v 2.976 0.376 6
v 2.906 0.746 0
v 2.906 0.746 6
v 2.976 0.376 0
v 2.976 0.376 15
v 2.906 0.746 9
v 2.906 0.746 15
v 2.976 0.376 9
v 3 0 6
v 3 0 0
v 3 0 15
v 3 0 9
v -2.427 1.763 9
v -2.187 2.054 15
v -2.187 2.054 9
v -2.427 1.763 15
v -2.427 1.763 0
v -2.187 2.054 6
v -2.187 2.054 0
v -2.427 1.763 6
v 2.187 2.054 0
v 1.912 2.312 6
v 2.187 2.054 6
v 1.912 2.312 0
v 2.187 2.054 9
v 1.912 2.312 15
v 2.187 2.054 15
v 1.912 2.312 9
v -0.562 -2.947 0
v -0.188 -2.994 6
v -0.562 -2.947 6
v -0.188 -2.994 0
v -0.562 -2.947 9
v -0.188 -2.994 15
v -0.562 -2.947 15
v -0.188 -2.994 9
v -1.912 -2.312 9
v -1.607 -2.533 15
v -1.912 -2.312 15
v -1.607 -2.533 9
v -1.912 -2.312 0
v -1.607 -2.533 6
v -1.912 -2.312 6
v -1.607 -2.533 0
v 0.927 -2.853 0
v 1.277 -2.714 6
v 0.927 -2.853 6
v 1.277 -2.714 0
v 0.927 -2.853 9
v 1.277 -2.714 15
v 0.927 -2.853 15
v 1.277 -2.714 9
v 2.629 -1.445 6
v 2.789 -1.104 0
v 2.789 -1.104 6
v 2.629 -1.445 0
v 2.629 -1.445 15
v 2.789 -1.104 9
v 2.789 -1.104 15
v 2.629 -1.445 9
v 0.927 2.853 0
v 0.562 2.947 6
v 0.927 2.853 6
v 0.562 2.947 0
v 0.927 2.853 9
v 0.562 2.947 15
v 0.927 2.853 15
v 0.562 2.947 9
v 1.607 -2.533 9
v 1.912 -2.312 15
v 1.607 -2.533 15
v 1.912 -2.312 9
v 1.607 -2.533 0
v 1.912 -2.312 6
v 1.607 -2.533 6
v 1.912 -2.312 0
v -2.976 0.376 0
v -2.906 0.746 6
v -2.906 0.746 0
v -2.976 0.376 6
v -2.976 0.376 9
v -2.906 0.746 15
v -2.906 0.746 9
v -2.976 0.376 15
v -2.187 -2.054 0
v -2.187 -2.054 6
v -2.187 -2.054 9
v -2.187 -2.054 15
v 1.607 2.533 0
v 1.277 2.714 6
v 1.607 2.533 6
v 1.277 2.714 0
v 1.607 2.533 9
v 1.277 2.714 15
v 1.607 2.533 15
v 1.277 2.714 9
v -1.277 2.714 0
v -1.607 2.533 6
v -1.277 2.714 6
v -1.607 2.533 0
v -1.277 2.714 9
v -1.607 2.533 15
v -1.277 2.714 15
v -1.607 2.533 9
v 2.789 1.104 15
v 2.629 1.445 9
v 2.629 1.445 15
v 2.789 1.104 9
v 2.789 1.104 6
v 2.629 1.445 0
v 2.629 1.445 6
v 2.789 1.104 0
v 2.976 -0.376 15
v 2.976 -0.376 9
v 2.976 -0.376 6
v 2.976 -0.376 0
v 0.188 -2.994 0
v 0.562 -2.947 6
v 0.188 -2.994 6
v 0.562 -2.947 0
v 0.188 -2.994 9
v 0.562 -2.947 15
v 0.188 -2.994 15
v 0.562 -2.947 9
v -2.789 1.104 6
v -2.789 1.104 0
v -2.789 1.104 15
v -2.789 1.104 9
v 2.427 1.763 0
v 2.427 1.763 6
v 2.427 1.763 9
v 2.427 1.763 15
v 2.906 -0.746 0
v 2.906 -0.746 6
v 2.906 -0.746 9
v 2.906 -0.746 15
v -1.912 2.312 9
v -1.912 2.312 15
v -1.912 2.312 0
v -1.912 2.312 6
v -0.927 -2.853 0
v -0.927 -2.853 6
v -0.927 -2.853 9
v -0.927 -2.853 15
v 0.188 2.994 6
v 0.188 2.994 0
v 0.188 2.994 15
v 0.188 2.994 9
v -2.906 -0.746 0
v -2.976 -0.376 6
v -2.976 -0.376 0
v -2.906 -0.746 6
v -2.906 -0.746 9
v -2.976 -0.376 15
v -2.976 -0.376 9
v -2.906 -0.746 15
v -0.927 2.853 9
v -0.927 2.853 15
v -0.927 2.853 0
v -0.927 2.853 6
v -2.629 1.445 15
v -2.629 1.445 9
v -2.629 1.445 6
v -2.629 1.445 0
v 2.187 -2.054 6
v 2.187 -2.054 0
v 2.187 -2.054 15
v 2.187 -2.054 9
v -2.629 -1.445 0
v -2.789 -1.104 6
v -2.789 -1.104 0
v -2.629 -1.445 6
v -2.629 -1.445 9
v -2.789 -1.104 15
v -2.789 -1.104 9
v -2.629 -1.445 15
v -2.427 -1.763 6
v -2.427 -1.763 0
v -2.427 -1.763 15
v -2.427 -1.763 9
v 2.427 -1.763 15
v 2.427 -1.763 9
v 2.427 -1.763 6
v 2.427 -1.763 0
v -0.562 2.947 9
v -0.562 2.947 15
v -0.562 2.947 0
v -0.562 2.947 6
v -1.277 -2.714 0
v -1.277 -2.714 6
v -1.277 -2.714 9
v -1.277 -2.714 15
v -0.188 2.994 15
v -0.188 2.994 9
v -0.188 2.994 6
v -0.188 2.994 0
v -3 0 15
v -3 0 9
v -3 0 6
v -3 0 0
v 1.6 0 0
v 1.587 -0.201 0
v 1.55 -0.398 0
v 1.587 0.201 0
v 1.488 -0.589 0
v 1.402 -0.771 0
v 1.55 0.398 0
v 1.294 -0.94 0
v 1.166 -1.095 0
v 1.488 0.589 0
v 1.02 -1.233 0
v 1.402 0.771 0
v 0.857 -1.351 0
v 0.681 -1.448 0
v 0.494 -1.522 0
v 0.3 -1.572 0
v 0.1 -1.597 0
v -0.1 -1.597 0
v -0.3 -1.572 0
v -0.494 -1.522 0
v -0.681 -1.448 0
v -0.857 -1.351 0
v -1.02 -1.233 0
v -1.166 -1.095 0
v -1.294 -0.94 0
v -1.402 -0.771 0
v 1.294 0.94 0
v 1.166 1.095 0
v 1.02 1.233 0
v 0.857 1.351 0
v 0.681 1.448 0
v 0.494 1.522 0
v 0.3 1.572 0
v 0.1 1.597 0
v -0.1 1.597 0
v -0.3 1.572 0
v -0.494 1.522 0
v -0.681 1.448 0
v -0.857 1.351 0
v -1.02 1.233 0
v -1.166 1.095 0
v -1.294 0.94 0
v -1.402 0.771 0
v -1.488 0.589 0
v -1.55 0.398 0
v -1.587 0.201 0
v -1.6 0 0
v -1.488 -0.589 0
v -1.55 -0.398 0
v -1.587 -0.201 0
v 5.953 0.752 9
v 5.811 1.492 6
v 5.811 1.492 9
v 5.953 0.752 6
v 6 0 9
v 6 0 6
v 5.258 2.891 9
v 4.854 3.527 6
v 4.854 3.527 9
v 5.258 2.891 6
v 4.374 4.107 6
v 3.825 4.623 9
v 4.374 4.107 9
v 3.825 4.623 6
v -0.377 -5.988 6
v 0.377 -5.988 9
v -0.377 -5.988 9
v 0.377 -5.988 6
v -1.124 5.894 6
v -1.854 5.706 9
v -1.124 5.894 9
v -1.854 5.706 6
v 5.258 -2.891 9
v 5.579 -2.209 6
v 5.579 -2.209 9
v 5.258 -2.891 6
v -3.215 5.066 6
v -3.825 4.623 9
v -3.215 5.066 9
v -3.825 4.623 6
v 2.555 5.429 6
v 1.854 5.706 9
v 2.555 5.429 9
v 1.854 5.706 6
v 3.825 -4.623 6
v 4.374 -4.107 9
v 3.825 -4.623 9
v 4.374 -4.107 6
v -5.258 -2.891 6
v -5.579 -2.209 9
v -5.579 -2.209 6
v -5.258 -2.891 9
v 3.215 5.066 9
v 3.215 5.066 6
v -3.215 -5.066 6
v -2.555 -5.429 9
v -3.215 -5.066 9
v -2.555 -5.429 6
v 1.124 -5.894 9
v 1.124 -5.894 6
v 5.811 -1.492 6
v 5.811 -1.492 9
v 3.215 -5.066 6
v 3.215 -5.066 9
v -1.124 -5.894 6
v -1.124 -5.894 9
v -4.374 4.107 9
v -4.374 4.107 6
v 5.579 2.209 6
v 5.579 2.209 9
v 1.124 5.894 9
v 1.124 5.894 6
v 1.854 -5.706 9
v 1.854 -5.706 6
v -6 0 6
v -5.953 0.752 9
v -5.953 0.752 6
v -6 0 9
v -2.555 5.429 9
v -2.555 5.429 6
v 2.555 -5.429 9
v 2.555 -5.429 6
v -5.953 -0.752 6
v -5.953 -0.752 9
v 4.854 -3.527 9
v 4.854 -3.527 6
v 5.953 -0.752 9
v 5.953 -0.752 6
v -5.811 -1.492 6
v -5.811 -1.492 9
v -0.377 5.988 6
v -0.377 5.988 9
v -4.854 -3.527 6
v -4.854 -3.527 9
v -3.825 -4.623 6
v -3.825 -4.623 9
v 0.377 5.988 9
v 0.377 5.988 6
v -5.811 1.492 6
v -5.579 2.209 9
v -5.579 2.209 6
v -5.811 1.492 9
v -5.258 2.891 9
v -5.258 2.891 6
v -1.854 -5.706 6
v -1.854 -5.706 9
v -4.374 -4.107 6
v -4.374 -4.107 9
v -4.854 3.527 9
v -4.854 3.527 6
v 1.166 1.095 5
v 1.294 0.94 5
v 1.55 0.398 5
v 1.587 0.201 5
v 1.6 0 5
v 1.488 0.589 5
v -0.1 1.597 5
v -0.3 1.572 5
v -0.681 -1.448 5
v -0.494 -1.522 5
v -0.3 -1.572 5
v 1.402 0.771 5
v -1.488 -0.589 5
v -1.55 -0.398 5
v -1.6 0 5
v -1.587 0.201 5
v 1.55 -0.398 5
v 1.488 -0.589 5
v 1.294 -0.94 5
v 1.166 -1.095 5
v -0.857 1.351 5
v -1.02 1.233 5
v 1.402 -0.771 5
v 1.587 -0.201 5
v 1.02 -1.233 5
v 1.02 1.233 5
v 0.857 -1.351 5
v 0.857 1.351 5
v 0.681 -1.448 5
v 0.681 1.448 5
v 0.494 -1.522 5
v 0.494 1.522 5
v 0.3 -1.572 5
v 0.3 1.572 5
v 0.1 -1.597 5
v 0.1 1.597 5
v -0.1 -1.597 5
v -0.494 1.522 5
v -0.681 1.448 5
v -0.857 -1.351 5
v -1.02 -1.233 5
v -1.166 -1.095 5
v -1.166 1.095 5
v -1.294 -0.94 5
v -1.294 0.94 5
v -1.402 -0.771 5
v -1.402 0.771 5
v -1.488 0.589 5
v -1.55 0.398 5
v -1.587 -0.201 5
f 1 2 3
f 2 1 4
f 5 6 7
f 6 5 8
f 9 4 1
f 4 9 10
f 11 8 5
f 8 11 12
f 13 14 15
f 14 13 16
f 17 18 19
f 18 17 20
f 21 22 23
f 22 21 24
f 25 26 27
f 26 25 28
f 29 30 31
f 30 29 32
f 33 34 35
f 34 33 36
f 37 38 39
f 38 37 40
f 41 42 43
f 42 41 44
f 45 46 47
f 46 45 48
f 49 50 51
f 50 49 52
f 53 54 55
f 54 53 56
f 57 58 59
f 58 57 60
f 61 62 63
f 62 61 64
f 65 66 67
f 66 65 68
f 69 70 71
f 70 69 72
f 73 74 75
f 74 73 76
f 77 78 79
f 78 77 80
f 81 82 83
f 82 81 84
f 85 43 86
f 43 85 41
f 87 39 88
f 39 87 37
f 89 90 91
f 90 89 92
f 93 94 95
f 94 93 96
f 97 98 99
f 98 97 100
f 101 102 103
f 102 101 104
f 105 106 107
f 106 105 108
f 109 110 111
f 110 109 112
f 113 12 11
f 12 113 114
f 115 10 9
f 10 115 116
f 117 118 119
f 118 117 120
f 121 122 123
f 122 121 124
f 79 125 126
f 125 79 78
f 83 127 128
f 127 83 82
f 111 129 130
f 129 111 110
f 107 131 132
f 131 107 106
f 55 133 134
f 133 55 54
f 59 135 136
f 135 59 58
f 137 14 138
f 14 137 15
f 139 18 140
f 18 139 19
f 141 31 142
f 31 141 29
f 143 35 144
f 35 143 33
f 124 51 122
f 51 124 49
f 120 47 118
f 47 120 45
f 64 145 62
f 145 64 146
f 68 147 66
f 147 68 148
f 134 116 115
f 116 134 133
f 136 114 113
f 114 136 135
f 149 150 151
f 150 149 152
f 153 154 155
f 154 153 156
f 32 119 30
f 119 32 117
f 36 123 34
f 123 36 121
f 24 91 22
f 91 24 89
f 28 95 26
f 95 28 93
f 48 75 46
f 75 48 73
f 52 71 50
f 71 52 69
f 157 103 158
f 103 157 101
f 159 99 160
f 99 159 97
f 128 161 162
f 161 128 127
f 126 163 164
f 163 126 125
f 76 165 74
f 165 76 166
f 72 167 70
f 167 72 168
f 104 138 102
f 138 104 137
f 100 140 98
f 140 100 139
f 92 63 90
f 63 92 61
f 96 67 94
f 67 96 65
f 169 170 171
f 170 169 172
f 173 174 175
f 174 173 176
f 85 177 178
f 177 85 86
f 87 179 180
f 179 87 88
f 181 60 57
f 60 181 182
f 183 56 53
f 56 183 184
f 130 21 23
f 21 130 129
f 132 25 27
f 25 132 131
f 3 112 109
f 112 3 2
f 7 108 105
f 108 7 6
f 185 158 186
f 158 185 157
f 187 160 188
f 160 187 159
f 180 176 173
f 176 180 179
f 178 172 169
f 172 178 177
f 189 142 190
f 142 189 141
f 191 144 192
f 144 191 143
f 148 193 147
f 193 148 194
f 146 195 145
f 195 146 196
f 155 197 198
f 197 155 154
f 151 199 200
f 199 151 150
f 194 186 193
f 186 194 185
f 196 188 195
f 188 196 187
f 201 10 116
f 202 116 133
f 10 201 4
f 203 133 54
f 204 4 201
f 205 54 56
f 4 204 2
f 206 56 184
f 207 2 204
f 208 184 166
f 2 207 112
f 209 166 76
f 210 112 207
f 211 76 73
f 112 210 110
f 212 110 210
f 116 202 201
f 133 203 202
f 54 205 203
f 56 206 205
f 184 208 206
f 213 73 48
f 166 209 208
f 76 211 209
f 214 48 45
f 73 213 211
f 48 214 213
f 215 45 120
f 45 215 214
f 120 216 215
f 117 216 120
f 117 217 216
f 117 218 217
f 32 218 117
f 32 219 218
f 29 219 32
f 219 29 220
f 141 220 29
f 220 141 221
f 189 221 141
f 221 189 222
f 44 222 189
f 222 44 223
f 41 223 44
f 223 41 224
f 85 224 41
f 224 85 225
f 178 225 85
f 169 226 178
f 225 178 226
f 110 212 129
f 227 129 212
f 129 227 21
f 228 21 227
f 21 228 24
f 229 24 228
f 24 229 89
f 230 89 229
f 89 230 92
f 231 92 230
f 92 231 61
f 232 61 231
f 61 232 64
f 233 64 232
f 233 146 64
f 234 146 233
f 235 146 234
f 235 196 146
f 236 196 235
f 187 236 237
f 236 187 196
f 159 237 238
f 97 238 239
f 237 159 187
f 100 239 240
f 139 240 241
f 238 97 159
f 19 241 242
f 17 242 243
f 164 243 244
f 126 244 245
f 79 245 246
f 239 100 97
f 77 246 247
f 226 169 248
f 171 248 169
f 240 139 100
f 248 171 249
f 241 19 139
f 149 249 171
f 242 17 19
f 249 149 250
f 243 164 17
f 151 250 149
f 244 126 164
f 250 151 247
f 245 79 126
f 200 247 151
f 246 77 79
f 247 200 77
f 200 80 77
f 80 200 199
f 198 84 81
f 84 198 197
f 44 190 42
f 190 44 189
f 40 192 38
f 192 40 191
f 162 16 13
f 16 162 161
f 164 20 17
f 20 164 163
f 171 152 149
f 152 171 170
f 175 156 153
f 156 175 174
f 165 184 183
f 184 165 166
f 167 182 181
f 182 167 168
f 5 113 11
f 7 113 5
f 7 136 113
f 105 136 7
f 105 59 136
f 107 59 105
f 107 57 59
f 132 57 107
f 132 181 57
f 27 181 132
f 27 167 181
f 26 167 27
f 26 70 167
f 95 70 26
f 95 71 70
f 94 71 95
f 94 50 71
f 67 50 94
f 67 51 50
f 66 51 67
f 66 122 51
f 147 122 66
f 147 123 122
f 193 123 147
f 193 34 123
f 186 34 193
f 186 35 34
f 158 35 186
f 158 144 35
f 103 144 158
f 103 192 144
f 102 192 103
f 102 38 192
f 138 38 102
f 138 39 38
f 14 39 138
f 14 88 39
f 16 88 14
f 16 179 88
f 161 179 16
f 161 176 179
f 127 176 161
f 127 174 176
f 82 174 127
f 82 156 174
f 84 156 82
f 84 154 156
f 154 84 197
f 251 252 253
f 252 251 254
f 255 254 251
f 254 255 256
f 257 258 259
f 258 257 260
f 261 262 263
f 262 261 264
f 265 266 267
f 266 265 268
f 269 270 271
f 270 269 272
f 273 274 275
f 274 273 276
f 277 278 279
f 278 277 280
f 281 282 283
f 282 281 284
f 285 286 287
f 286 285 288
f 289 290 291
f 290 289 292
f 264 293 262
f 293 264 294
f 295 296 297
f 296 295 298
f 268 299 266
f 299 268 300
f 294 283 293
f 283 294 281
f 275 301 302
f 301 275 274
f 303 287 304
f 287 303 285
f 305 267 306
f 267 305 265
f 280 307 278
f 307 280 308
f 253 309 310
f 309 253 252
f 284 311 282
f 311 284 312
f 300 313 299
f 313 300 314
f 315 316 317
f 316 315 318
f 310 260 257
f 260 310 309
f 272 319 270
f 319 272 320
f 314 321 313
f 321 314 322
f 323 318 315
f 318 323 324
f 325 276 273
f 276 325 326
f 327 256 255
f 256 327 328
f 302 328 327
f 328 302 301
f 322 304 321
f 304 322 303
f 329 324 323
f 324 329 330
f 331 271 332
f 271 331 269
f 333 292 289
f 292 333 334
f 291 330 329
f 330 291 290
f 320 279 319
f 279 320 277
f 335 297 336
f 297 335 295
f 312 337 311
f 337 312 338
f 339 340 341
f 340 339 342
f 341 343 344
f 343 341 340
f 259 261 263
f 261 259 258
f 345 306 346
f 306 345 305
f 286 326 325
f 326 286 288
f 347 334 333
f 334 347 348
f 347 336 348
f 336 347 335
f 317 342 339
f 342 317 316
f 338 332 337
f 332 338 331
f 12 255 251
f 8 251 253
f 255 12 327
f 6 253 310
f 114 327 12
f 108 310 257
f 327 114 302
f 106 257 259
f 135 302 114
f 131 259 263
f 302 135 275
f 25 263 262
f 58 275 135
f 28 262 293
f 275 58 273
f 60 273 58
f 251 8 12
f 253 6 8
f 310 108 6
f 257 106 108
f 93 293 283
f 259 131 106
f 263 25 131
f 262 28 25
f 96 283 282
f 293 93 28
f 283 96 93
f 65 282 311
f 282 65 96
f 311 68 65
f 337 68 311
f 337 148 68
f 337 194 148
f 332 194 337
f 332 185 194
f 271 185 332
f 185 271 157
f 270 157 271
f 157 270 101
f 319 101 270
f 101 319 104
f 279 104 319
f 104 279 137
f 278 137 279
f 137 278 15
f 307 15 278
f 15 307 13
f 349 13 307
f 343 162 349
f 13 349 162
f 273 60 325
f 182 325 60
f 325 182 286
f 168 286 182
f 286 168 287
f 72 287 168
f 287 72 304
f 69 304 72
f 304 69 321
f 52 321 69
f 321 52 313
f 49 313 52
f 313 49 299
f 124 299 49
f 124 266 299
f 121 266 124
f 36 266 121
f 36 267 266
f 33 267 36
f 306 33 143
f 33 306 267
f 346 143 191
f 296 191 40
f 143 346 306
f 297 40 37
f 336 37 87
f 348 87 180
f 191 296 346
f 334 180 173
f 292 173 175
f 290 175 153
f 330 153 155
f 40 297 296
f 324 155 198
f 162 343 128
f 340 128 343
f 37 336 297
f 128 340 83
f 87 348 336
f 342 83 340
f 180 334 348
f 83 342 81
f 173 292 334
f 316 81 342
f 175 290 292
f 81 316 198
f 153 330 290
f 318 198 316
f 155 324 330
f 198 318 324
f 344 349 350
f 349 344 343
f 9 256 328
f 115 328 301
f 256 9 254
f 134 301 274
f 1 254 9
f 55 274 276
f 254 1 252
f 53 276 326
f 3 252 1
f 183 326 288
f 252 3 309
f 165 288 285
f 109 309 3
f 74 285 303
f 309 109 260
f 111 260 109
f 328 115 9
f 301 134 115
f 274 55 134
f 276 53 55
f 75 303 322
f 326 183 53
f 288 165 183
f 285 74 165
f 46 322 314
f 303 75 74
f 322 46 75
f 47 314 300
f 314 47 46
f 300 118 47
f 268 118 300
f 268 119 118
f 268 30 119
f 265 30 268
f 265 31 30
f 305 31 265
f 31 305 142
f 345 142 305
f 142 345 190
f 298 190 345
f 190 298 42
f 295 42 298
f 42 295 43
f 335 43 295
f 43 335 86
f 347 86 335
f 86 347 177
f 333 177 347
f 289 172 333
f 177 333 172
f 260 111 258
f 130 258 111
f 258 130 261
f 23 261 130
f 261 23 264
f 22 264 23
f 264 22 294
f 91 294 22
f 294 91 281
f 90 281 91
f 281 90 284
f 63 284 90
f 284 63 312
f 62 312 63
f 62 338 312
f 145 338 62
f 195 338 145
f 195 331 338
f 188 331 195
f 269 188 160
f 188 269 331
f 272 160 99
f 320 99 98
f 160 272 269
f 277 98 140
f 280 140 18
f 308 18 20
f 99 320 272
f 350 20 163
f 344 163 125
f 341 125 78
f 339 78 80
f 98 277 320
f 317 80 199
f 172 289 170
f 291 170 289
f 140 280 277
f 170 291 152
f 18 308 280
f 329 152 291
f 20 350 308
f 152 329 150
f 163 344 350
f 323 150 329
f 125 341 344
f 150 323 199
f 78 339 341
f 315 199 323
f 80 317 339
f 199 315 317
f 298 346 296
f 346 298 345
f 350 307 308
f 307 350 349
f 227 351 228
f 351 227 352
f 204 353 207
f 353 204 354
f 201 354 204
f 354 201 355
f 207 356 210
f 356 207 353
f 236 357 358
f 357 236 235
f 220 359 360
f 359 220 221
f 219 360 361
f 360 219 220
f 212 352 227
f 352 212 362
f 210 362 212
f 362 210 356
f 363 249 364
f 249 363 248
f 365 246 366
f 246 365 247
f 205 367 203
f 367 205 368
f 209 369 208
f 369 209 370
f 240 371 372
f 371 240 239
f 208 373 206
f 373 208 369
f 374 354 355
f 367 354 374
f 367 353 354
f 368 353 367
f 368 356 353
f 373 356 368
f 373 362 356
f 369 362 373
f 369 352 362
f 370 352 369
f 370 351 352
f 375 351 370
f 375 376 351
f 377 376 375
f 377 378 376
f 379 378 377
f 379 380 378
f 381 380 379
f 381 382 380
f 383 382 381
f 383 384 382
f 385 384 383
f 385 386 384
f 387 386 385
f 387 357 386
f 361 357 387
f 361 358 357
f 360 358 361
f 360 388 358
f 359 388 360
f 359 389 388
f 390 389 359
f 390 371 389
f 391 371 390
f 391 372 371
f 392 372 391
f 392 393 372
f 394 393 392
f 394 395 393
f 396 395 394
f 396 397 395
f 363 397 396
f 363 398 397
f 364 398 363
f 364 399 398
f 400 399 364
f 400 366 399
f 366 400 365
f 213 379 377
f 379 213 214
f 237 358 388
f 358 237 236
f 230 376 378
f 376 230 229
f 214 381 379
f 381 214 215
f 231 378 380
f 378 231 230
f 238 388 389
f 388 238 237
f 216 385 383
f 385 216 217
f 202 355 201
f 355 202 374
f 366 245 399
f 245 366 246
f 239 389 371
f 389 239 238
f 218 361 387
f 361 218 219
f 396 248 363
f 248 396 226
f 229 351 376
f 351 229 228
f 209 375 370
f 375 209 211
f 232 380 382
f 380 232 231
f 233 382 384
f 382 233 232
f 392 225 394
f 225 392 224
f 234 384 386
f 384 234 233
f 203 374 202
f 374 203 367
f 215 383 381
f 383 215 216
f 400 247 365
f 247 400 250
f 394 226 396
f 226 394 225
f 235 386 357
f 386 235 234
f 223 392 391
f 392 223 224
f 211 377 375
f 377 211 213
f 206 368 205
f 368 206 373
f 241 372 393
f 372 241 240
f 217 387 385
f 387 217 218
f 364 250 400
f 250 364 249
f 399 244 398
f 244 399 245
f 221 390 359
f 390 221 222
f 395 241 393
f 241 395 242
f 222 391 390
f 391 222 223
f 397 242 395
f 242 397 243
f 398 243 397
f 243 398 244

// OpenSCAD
$fn = 50;
button_h = 13;
overlap = 5;
total_height = 23;
th = 2; // enclosure thickness
eps = 1e-1;

cap_r = 6 / 2;
cap_h = total_height - button_h + overlap;

border_offset = 4 + th;
border_h = 3;
border_r = cap_r + 3;

socket_r = 3.2 / 2;

difference() {
  union() {
    cylinder(r=cap_r, h=cap_h);
    translate([0, 0, cap_h - border_h - border_offset]) {
      cylinder(r=border_r, h=border_h);
    }
  }
  translate([0, 0, -eps]) {
    cylinder(r=socket_r, h=overlap+eps);
  }
}
